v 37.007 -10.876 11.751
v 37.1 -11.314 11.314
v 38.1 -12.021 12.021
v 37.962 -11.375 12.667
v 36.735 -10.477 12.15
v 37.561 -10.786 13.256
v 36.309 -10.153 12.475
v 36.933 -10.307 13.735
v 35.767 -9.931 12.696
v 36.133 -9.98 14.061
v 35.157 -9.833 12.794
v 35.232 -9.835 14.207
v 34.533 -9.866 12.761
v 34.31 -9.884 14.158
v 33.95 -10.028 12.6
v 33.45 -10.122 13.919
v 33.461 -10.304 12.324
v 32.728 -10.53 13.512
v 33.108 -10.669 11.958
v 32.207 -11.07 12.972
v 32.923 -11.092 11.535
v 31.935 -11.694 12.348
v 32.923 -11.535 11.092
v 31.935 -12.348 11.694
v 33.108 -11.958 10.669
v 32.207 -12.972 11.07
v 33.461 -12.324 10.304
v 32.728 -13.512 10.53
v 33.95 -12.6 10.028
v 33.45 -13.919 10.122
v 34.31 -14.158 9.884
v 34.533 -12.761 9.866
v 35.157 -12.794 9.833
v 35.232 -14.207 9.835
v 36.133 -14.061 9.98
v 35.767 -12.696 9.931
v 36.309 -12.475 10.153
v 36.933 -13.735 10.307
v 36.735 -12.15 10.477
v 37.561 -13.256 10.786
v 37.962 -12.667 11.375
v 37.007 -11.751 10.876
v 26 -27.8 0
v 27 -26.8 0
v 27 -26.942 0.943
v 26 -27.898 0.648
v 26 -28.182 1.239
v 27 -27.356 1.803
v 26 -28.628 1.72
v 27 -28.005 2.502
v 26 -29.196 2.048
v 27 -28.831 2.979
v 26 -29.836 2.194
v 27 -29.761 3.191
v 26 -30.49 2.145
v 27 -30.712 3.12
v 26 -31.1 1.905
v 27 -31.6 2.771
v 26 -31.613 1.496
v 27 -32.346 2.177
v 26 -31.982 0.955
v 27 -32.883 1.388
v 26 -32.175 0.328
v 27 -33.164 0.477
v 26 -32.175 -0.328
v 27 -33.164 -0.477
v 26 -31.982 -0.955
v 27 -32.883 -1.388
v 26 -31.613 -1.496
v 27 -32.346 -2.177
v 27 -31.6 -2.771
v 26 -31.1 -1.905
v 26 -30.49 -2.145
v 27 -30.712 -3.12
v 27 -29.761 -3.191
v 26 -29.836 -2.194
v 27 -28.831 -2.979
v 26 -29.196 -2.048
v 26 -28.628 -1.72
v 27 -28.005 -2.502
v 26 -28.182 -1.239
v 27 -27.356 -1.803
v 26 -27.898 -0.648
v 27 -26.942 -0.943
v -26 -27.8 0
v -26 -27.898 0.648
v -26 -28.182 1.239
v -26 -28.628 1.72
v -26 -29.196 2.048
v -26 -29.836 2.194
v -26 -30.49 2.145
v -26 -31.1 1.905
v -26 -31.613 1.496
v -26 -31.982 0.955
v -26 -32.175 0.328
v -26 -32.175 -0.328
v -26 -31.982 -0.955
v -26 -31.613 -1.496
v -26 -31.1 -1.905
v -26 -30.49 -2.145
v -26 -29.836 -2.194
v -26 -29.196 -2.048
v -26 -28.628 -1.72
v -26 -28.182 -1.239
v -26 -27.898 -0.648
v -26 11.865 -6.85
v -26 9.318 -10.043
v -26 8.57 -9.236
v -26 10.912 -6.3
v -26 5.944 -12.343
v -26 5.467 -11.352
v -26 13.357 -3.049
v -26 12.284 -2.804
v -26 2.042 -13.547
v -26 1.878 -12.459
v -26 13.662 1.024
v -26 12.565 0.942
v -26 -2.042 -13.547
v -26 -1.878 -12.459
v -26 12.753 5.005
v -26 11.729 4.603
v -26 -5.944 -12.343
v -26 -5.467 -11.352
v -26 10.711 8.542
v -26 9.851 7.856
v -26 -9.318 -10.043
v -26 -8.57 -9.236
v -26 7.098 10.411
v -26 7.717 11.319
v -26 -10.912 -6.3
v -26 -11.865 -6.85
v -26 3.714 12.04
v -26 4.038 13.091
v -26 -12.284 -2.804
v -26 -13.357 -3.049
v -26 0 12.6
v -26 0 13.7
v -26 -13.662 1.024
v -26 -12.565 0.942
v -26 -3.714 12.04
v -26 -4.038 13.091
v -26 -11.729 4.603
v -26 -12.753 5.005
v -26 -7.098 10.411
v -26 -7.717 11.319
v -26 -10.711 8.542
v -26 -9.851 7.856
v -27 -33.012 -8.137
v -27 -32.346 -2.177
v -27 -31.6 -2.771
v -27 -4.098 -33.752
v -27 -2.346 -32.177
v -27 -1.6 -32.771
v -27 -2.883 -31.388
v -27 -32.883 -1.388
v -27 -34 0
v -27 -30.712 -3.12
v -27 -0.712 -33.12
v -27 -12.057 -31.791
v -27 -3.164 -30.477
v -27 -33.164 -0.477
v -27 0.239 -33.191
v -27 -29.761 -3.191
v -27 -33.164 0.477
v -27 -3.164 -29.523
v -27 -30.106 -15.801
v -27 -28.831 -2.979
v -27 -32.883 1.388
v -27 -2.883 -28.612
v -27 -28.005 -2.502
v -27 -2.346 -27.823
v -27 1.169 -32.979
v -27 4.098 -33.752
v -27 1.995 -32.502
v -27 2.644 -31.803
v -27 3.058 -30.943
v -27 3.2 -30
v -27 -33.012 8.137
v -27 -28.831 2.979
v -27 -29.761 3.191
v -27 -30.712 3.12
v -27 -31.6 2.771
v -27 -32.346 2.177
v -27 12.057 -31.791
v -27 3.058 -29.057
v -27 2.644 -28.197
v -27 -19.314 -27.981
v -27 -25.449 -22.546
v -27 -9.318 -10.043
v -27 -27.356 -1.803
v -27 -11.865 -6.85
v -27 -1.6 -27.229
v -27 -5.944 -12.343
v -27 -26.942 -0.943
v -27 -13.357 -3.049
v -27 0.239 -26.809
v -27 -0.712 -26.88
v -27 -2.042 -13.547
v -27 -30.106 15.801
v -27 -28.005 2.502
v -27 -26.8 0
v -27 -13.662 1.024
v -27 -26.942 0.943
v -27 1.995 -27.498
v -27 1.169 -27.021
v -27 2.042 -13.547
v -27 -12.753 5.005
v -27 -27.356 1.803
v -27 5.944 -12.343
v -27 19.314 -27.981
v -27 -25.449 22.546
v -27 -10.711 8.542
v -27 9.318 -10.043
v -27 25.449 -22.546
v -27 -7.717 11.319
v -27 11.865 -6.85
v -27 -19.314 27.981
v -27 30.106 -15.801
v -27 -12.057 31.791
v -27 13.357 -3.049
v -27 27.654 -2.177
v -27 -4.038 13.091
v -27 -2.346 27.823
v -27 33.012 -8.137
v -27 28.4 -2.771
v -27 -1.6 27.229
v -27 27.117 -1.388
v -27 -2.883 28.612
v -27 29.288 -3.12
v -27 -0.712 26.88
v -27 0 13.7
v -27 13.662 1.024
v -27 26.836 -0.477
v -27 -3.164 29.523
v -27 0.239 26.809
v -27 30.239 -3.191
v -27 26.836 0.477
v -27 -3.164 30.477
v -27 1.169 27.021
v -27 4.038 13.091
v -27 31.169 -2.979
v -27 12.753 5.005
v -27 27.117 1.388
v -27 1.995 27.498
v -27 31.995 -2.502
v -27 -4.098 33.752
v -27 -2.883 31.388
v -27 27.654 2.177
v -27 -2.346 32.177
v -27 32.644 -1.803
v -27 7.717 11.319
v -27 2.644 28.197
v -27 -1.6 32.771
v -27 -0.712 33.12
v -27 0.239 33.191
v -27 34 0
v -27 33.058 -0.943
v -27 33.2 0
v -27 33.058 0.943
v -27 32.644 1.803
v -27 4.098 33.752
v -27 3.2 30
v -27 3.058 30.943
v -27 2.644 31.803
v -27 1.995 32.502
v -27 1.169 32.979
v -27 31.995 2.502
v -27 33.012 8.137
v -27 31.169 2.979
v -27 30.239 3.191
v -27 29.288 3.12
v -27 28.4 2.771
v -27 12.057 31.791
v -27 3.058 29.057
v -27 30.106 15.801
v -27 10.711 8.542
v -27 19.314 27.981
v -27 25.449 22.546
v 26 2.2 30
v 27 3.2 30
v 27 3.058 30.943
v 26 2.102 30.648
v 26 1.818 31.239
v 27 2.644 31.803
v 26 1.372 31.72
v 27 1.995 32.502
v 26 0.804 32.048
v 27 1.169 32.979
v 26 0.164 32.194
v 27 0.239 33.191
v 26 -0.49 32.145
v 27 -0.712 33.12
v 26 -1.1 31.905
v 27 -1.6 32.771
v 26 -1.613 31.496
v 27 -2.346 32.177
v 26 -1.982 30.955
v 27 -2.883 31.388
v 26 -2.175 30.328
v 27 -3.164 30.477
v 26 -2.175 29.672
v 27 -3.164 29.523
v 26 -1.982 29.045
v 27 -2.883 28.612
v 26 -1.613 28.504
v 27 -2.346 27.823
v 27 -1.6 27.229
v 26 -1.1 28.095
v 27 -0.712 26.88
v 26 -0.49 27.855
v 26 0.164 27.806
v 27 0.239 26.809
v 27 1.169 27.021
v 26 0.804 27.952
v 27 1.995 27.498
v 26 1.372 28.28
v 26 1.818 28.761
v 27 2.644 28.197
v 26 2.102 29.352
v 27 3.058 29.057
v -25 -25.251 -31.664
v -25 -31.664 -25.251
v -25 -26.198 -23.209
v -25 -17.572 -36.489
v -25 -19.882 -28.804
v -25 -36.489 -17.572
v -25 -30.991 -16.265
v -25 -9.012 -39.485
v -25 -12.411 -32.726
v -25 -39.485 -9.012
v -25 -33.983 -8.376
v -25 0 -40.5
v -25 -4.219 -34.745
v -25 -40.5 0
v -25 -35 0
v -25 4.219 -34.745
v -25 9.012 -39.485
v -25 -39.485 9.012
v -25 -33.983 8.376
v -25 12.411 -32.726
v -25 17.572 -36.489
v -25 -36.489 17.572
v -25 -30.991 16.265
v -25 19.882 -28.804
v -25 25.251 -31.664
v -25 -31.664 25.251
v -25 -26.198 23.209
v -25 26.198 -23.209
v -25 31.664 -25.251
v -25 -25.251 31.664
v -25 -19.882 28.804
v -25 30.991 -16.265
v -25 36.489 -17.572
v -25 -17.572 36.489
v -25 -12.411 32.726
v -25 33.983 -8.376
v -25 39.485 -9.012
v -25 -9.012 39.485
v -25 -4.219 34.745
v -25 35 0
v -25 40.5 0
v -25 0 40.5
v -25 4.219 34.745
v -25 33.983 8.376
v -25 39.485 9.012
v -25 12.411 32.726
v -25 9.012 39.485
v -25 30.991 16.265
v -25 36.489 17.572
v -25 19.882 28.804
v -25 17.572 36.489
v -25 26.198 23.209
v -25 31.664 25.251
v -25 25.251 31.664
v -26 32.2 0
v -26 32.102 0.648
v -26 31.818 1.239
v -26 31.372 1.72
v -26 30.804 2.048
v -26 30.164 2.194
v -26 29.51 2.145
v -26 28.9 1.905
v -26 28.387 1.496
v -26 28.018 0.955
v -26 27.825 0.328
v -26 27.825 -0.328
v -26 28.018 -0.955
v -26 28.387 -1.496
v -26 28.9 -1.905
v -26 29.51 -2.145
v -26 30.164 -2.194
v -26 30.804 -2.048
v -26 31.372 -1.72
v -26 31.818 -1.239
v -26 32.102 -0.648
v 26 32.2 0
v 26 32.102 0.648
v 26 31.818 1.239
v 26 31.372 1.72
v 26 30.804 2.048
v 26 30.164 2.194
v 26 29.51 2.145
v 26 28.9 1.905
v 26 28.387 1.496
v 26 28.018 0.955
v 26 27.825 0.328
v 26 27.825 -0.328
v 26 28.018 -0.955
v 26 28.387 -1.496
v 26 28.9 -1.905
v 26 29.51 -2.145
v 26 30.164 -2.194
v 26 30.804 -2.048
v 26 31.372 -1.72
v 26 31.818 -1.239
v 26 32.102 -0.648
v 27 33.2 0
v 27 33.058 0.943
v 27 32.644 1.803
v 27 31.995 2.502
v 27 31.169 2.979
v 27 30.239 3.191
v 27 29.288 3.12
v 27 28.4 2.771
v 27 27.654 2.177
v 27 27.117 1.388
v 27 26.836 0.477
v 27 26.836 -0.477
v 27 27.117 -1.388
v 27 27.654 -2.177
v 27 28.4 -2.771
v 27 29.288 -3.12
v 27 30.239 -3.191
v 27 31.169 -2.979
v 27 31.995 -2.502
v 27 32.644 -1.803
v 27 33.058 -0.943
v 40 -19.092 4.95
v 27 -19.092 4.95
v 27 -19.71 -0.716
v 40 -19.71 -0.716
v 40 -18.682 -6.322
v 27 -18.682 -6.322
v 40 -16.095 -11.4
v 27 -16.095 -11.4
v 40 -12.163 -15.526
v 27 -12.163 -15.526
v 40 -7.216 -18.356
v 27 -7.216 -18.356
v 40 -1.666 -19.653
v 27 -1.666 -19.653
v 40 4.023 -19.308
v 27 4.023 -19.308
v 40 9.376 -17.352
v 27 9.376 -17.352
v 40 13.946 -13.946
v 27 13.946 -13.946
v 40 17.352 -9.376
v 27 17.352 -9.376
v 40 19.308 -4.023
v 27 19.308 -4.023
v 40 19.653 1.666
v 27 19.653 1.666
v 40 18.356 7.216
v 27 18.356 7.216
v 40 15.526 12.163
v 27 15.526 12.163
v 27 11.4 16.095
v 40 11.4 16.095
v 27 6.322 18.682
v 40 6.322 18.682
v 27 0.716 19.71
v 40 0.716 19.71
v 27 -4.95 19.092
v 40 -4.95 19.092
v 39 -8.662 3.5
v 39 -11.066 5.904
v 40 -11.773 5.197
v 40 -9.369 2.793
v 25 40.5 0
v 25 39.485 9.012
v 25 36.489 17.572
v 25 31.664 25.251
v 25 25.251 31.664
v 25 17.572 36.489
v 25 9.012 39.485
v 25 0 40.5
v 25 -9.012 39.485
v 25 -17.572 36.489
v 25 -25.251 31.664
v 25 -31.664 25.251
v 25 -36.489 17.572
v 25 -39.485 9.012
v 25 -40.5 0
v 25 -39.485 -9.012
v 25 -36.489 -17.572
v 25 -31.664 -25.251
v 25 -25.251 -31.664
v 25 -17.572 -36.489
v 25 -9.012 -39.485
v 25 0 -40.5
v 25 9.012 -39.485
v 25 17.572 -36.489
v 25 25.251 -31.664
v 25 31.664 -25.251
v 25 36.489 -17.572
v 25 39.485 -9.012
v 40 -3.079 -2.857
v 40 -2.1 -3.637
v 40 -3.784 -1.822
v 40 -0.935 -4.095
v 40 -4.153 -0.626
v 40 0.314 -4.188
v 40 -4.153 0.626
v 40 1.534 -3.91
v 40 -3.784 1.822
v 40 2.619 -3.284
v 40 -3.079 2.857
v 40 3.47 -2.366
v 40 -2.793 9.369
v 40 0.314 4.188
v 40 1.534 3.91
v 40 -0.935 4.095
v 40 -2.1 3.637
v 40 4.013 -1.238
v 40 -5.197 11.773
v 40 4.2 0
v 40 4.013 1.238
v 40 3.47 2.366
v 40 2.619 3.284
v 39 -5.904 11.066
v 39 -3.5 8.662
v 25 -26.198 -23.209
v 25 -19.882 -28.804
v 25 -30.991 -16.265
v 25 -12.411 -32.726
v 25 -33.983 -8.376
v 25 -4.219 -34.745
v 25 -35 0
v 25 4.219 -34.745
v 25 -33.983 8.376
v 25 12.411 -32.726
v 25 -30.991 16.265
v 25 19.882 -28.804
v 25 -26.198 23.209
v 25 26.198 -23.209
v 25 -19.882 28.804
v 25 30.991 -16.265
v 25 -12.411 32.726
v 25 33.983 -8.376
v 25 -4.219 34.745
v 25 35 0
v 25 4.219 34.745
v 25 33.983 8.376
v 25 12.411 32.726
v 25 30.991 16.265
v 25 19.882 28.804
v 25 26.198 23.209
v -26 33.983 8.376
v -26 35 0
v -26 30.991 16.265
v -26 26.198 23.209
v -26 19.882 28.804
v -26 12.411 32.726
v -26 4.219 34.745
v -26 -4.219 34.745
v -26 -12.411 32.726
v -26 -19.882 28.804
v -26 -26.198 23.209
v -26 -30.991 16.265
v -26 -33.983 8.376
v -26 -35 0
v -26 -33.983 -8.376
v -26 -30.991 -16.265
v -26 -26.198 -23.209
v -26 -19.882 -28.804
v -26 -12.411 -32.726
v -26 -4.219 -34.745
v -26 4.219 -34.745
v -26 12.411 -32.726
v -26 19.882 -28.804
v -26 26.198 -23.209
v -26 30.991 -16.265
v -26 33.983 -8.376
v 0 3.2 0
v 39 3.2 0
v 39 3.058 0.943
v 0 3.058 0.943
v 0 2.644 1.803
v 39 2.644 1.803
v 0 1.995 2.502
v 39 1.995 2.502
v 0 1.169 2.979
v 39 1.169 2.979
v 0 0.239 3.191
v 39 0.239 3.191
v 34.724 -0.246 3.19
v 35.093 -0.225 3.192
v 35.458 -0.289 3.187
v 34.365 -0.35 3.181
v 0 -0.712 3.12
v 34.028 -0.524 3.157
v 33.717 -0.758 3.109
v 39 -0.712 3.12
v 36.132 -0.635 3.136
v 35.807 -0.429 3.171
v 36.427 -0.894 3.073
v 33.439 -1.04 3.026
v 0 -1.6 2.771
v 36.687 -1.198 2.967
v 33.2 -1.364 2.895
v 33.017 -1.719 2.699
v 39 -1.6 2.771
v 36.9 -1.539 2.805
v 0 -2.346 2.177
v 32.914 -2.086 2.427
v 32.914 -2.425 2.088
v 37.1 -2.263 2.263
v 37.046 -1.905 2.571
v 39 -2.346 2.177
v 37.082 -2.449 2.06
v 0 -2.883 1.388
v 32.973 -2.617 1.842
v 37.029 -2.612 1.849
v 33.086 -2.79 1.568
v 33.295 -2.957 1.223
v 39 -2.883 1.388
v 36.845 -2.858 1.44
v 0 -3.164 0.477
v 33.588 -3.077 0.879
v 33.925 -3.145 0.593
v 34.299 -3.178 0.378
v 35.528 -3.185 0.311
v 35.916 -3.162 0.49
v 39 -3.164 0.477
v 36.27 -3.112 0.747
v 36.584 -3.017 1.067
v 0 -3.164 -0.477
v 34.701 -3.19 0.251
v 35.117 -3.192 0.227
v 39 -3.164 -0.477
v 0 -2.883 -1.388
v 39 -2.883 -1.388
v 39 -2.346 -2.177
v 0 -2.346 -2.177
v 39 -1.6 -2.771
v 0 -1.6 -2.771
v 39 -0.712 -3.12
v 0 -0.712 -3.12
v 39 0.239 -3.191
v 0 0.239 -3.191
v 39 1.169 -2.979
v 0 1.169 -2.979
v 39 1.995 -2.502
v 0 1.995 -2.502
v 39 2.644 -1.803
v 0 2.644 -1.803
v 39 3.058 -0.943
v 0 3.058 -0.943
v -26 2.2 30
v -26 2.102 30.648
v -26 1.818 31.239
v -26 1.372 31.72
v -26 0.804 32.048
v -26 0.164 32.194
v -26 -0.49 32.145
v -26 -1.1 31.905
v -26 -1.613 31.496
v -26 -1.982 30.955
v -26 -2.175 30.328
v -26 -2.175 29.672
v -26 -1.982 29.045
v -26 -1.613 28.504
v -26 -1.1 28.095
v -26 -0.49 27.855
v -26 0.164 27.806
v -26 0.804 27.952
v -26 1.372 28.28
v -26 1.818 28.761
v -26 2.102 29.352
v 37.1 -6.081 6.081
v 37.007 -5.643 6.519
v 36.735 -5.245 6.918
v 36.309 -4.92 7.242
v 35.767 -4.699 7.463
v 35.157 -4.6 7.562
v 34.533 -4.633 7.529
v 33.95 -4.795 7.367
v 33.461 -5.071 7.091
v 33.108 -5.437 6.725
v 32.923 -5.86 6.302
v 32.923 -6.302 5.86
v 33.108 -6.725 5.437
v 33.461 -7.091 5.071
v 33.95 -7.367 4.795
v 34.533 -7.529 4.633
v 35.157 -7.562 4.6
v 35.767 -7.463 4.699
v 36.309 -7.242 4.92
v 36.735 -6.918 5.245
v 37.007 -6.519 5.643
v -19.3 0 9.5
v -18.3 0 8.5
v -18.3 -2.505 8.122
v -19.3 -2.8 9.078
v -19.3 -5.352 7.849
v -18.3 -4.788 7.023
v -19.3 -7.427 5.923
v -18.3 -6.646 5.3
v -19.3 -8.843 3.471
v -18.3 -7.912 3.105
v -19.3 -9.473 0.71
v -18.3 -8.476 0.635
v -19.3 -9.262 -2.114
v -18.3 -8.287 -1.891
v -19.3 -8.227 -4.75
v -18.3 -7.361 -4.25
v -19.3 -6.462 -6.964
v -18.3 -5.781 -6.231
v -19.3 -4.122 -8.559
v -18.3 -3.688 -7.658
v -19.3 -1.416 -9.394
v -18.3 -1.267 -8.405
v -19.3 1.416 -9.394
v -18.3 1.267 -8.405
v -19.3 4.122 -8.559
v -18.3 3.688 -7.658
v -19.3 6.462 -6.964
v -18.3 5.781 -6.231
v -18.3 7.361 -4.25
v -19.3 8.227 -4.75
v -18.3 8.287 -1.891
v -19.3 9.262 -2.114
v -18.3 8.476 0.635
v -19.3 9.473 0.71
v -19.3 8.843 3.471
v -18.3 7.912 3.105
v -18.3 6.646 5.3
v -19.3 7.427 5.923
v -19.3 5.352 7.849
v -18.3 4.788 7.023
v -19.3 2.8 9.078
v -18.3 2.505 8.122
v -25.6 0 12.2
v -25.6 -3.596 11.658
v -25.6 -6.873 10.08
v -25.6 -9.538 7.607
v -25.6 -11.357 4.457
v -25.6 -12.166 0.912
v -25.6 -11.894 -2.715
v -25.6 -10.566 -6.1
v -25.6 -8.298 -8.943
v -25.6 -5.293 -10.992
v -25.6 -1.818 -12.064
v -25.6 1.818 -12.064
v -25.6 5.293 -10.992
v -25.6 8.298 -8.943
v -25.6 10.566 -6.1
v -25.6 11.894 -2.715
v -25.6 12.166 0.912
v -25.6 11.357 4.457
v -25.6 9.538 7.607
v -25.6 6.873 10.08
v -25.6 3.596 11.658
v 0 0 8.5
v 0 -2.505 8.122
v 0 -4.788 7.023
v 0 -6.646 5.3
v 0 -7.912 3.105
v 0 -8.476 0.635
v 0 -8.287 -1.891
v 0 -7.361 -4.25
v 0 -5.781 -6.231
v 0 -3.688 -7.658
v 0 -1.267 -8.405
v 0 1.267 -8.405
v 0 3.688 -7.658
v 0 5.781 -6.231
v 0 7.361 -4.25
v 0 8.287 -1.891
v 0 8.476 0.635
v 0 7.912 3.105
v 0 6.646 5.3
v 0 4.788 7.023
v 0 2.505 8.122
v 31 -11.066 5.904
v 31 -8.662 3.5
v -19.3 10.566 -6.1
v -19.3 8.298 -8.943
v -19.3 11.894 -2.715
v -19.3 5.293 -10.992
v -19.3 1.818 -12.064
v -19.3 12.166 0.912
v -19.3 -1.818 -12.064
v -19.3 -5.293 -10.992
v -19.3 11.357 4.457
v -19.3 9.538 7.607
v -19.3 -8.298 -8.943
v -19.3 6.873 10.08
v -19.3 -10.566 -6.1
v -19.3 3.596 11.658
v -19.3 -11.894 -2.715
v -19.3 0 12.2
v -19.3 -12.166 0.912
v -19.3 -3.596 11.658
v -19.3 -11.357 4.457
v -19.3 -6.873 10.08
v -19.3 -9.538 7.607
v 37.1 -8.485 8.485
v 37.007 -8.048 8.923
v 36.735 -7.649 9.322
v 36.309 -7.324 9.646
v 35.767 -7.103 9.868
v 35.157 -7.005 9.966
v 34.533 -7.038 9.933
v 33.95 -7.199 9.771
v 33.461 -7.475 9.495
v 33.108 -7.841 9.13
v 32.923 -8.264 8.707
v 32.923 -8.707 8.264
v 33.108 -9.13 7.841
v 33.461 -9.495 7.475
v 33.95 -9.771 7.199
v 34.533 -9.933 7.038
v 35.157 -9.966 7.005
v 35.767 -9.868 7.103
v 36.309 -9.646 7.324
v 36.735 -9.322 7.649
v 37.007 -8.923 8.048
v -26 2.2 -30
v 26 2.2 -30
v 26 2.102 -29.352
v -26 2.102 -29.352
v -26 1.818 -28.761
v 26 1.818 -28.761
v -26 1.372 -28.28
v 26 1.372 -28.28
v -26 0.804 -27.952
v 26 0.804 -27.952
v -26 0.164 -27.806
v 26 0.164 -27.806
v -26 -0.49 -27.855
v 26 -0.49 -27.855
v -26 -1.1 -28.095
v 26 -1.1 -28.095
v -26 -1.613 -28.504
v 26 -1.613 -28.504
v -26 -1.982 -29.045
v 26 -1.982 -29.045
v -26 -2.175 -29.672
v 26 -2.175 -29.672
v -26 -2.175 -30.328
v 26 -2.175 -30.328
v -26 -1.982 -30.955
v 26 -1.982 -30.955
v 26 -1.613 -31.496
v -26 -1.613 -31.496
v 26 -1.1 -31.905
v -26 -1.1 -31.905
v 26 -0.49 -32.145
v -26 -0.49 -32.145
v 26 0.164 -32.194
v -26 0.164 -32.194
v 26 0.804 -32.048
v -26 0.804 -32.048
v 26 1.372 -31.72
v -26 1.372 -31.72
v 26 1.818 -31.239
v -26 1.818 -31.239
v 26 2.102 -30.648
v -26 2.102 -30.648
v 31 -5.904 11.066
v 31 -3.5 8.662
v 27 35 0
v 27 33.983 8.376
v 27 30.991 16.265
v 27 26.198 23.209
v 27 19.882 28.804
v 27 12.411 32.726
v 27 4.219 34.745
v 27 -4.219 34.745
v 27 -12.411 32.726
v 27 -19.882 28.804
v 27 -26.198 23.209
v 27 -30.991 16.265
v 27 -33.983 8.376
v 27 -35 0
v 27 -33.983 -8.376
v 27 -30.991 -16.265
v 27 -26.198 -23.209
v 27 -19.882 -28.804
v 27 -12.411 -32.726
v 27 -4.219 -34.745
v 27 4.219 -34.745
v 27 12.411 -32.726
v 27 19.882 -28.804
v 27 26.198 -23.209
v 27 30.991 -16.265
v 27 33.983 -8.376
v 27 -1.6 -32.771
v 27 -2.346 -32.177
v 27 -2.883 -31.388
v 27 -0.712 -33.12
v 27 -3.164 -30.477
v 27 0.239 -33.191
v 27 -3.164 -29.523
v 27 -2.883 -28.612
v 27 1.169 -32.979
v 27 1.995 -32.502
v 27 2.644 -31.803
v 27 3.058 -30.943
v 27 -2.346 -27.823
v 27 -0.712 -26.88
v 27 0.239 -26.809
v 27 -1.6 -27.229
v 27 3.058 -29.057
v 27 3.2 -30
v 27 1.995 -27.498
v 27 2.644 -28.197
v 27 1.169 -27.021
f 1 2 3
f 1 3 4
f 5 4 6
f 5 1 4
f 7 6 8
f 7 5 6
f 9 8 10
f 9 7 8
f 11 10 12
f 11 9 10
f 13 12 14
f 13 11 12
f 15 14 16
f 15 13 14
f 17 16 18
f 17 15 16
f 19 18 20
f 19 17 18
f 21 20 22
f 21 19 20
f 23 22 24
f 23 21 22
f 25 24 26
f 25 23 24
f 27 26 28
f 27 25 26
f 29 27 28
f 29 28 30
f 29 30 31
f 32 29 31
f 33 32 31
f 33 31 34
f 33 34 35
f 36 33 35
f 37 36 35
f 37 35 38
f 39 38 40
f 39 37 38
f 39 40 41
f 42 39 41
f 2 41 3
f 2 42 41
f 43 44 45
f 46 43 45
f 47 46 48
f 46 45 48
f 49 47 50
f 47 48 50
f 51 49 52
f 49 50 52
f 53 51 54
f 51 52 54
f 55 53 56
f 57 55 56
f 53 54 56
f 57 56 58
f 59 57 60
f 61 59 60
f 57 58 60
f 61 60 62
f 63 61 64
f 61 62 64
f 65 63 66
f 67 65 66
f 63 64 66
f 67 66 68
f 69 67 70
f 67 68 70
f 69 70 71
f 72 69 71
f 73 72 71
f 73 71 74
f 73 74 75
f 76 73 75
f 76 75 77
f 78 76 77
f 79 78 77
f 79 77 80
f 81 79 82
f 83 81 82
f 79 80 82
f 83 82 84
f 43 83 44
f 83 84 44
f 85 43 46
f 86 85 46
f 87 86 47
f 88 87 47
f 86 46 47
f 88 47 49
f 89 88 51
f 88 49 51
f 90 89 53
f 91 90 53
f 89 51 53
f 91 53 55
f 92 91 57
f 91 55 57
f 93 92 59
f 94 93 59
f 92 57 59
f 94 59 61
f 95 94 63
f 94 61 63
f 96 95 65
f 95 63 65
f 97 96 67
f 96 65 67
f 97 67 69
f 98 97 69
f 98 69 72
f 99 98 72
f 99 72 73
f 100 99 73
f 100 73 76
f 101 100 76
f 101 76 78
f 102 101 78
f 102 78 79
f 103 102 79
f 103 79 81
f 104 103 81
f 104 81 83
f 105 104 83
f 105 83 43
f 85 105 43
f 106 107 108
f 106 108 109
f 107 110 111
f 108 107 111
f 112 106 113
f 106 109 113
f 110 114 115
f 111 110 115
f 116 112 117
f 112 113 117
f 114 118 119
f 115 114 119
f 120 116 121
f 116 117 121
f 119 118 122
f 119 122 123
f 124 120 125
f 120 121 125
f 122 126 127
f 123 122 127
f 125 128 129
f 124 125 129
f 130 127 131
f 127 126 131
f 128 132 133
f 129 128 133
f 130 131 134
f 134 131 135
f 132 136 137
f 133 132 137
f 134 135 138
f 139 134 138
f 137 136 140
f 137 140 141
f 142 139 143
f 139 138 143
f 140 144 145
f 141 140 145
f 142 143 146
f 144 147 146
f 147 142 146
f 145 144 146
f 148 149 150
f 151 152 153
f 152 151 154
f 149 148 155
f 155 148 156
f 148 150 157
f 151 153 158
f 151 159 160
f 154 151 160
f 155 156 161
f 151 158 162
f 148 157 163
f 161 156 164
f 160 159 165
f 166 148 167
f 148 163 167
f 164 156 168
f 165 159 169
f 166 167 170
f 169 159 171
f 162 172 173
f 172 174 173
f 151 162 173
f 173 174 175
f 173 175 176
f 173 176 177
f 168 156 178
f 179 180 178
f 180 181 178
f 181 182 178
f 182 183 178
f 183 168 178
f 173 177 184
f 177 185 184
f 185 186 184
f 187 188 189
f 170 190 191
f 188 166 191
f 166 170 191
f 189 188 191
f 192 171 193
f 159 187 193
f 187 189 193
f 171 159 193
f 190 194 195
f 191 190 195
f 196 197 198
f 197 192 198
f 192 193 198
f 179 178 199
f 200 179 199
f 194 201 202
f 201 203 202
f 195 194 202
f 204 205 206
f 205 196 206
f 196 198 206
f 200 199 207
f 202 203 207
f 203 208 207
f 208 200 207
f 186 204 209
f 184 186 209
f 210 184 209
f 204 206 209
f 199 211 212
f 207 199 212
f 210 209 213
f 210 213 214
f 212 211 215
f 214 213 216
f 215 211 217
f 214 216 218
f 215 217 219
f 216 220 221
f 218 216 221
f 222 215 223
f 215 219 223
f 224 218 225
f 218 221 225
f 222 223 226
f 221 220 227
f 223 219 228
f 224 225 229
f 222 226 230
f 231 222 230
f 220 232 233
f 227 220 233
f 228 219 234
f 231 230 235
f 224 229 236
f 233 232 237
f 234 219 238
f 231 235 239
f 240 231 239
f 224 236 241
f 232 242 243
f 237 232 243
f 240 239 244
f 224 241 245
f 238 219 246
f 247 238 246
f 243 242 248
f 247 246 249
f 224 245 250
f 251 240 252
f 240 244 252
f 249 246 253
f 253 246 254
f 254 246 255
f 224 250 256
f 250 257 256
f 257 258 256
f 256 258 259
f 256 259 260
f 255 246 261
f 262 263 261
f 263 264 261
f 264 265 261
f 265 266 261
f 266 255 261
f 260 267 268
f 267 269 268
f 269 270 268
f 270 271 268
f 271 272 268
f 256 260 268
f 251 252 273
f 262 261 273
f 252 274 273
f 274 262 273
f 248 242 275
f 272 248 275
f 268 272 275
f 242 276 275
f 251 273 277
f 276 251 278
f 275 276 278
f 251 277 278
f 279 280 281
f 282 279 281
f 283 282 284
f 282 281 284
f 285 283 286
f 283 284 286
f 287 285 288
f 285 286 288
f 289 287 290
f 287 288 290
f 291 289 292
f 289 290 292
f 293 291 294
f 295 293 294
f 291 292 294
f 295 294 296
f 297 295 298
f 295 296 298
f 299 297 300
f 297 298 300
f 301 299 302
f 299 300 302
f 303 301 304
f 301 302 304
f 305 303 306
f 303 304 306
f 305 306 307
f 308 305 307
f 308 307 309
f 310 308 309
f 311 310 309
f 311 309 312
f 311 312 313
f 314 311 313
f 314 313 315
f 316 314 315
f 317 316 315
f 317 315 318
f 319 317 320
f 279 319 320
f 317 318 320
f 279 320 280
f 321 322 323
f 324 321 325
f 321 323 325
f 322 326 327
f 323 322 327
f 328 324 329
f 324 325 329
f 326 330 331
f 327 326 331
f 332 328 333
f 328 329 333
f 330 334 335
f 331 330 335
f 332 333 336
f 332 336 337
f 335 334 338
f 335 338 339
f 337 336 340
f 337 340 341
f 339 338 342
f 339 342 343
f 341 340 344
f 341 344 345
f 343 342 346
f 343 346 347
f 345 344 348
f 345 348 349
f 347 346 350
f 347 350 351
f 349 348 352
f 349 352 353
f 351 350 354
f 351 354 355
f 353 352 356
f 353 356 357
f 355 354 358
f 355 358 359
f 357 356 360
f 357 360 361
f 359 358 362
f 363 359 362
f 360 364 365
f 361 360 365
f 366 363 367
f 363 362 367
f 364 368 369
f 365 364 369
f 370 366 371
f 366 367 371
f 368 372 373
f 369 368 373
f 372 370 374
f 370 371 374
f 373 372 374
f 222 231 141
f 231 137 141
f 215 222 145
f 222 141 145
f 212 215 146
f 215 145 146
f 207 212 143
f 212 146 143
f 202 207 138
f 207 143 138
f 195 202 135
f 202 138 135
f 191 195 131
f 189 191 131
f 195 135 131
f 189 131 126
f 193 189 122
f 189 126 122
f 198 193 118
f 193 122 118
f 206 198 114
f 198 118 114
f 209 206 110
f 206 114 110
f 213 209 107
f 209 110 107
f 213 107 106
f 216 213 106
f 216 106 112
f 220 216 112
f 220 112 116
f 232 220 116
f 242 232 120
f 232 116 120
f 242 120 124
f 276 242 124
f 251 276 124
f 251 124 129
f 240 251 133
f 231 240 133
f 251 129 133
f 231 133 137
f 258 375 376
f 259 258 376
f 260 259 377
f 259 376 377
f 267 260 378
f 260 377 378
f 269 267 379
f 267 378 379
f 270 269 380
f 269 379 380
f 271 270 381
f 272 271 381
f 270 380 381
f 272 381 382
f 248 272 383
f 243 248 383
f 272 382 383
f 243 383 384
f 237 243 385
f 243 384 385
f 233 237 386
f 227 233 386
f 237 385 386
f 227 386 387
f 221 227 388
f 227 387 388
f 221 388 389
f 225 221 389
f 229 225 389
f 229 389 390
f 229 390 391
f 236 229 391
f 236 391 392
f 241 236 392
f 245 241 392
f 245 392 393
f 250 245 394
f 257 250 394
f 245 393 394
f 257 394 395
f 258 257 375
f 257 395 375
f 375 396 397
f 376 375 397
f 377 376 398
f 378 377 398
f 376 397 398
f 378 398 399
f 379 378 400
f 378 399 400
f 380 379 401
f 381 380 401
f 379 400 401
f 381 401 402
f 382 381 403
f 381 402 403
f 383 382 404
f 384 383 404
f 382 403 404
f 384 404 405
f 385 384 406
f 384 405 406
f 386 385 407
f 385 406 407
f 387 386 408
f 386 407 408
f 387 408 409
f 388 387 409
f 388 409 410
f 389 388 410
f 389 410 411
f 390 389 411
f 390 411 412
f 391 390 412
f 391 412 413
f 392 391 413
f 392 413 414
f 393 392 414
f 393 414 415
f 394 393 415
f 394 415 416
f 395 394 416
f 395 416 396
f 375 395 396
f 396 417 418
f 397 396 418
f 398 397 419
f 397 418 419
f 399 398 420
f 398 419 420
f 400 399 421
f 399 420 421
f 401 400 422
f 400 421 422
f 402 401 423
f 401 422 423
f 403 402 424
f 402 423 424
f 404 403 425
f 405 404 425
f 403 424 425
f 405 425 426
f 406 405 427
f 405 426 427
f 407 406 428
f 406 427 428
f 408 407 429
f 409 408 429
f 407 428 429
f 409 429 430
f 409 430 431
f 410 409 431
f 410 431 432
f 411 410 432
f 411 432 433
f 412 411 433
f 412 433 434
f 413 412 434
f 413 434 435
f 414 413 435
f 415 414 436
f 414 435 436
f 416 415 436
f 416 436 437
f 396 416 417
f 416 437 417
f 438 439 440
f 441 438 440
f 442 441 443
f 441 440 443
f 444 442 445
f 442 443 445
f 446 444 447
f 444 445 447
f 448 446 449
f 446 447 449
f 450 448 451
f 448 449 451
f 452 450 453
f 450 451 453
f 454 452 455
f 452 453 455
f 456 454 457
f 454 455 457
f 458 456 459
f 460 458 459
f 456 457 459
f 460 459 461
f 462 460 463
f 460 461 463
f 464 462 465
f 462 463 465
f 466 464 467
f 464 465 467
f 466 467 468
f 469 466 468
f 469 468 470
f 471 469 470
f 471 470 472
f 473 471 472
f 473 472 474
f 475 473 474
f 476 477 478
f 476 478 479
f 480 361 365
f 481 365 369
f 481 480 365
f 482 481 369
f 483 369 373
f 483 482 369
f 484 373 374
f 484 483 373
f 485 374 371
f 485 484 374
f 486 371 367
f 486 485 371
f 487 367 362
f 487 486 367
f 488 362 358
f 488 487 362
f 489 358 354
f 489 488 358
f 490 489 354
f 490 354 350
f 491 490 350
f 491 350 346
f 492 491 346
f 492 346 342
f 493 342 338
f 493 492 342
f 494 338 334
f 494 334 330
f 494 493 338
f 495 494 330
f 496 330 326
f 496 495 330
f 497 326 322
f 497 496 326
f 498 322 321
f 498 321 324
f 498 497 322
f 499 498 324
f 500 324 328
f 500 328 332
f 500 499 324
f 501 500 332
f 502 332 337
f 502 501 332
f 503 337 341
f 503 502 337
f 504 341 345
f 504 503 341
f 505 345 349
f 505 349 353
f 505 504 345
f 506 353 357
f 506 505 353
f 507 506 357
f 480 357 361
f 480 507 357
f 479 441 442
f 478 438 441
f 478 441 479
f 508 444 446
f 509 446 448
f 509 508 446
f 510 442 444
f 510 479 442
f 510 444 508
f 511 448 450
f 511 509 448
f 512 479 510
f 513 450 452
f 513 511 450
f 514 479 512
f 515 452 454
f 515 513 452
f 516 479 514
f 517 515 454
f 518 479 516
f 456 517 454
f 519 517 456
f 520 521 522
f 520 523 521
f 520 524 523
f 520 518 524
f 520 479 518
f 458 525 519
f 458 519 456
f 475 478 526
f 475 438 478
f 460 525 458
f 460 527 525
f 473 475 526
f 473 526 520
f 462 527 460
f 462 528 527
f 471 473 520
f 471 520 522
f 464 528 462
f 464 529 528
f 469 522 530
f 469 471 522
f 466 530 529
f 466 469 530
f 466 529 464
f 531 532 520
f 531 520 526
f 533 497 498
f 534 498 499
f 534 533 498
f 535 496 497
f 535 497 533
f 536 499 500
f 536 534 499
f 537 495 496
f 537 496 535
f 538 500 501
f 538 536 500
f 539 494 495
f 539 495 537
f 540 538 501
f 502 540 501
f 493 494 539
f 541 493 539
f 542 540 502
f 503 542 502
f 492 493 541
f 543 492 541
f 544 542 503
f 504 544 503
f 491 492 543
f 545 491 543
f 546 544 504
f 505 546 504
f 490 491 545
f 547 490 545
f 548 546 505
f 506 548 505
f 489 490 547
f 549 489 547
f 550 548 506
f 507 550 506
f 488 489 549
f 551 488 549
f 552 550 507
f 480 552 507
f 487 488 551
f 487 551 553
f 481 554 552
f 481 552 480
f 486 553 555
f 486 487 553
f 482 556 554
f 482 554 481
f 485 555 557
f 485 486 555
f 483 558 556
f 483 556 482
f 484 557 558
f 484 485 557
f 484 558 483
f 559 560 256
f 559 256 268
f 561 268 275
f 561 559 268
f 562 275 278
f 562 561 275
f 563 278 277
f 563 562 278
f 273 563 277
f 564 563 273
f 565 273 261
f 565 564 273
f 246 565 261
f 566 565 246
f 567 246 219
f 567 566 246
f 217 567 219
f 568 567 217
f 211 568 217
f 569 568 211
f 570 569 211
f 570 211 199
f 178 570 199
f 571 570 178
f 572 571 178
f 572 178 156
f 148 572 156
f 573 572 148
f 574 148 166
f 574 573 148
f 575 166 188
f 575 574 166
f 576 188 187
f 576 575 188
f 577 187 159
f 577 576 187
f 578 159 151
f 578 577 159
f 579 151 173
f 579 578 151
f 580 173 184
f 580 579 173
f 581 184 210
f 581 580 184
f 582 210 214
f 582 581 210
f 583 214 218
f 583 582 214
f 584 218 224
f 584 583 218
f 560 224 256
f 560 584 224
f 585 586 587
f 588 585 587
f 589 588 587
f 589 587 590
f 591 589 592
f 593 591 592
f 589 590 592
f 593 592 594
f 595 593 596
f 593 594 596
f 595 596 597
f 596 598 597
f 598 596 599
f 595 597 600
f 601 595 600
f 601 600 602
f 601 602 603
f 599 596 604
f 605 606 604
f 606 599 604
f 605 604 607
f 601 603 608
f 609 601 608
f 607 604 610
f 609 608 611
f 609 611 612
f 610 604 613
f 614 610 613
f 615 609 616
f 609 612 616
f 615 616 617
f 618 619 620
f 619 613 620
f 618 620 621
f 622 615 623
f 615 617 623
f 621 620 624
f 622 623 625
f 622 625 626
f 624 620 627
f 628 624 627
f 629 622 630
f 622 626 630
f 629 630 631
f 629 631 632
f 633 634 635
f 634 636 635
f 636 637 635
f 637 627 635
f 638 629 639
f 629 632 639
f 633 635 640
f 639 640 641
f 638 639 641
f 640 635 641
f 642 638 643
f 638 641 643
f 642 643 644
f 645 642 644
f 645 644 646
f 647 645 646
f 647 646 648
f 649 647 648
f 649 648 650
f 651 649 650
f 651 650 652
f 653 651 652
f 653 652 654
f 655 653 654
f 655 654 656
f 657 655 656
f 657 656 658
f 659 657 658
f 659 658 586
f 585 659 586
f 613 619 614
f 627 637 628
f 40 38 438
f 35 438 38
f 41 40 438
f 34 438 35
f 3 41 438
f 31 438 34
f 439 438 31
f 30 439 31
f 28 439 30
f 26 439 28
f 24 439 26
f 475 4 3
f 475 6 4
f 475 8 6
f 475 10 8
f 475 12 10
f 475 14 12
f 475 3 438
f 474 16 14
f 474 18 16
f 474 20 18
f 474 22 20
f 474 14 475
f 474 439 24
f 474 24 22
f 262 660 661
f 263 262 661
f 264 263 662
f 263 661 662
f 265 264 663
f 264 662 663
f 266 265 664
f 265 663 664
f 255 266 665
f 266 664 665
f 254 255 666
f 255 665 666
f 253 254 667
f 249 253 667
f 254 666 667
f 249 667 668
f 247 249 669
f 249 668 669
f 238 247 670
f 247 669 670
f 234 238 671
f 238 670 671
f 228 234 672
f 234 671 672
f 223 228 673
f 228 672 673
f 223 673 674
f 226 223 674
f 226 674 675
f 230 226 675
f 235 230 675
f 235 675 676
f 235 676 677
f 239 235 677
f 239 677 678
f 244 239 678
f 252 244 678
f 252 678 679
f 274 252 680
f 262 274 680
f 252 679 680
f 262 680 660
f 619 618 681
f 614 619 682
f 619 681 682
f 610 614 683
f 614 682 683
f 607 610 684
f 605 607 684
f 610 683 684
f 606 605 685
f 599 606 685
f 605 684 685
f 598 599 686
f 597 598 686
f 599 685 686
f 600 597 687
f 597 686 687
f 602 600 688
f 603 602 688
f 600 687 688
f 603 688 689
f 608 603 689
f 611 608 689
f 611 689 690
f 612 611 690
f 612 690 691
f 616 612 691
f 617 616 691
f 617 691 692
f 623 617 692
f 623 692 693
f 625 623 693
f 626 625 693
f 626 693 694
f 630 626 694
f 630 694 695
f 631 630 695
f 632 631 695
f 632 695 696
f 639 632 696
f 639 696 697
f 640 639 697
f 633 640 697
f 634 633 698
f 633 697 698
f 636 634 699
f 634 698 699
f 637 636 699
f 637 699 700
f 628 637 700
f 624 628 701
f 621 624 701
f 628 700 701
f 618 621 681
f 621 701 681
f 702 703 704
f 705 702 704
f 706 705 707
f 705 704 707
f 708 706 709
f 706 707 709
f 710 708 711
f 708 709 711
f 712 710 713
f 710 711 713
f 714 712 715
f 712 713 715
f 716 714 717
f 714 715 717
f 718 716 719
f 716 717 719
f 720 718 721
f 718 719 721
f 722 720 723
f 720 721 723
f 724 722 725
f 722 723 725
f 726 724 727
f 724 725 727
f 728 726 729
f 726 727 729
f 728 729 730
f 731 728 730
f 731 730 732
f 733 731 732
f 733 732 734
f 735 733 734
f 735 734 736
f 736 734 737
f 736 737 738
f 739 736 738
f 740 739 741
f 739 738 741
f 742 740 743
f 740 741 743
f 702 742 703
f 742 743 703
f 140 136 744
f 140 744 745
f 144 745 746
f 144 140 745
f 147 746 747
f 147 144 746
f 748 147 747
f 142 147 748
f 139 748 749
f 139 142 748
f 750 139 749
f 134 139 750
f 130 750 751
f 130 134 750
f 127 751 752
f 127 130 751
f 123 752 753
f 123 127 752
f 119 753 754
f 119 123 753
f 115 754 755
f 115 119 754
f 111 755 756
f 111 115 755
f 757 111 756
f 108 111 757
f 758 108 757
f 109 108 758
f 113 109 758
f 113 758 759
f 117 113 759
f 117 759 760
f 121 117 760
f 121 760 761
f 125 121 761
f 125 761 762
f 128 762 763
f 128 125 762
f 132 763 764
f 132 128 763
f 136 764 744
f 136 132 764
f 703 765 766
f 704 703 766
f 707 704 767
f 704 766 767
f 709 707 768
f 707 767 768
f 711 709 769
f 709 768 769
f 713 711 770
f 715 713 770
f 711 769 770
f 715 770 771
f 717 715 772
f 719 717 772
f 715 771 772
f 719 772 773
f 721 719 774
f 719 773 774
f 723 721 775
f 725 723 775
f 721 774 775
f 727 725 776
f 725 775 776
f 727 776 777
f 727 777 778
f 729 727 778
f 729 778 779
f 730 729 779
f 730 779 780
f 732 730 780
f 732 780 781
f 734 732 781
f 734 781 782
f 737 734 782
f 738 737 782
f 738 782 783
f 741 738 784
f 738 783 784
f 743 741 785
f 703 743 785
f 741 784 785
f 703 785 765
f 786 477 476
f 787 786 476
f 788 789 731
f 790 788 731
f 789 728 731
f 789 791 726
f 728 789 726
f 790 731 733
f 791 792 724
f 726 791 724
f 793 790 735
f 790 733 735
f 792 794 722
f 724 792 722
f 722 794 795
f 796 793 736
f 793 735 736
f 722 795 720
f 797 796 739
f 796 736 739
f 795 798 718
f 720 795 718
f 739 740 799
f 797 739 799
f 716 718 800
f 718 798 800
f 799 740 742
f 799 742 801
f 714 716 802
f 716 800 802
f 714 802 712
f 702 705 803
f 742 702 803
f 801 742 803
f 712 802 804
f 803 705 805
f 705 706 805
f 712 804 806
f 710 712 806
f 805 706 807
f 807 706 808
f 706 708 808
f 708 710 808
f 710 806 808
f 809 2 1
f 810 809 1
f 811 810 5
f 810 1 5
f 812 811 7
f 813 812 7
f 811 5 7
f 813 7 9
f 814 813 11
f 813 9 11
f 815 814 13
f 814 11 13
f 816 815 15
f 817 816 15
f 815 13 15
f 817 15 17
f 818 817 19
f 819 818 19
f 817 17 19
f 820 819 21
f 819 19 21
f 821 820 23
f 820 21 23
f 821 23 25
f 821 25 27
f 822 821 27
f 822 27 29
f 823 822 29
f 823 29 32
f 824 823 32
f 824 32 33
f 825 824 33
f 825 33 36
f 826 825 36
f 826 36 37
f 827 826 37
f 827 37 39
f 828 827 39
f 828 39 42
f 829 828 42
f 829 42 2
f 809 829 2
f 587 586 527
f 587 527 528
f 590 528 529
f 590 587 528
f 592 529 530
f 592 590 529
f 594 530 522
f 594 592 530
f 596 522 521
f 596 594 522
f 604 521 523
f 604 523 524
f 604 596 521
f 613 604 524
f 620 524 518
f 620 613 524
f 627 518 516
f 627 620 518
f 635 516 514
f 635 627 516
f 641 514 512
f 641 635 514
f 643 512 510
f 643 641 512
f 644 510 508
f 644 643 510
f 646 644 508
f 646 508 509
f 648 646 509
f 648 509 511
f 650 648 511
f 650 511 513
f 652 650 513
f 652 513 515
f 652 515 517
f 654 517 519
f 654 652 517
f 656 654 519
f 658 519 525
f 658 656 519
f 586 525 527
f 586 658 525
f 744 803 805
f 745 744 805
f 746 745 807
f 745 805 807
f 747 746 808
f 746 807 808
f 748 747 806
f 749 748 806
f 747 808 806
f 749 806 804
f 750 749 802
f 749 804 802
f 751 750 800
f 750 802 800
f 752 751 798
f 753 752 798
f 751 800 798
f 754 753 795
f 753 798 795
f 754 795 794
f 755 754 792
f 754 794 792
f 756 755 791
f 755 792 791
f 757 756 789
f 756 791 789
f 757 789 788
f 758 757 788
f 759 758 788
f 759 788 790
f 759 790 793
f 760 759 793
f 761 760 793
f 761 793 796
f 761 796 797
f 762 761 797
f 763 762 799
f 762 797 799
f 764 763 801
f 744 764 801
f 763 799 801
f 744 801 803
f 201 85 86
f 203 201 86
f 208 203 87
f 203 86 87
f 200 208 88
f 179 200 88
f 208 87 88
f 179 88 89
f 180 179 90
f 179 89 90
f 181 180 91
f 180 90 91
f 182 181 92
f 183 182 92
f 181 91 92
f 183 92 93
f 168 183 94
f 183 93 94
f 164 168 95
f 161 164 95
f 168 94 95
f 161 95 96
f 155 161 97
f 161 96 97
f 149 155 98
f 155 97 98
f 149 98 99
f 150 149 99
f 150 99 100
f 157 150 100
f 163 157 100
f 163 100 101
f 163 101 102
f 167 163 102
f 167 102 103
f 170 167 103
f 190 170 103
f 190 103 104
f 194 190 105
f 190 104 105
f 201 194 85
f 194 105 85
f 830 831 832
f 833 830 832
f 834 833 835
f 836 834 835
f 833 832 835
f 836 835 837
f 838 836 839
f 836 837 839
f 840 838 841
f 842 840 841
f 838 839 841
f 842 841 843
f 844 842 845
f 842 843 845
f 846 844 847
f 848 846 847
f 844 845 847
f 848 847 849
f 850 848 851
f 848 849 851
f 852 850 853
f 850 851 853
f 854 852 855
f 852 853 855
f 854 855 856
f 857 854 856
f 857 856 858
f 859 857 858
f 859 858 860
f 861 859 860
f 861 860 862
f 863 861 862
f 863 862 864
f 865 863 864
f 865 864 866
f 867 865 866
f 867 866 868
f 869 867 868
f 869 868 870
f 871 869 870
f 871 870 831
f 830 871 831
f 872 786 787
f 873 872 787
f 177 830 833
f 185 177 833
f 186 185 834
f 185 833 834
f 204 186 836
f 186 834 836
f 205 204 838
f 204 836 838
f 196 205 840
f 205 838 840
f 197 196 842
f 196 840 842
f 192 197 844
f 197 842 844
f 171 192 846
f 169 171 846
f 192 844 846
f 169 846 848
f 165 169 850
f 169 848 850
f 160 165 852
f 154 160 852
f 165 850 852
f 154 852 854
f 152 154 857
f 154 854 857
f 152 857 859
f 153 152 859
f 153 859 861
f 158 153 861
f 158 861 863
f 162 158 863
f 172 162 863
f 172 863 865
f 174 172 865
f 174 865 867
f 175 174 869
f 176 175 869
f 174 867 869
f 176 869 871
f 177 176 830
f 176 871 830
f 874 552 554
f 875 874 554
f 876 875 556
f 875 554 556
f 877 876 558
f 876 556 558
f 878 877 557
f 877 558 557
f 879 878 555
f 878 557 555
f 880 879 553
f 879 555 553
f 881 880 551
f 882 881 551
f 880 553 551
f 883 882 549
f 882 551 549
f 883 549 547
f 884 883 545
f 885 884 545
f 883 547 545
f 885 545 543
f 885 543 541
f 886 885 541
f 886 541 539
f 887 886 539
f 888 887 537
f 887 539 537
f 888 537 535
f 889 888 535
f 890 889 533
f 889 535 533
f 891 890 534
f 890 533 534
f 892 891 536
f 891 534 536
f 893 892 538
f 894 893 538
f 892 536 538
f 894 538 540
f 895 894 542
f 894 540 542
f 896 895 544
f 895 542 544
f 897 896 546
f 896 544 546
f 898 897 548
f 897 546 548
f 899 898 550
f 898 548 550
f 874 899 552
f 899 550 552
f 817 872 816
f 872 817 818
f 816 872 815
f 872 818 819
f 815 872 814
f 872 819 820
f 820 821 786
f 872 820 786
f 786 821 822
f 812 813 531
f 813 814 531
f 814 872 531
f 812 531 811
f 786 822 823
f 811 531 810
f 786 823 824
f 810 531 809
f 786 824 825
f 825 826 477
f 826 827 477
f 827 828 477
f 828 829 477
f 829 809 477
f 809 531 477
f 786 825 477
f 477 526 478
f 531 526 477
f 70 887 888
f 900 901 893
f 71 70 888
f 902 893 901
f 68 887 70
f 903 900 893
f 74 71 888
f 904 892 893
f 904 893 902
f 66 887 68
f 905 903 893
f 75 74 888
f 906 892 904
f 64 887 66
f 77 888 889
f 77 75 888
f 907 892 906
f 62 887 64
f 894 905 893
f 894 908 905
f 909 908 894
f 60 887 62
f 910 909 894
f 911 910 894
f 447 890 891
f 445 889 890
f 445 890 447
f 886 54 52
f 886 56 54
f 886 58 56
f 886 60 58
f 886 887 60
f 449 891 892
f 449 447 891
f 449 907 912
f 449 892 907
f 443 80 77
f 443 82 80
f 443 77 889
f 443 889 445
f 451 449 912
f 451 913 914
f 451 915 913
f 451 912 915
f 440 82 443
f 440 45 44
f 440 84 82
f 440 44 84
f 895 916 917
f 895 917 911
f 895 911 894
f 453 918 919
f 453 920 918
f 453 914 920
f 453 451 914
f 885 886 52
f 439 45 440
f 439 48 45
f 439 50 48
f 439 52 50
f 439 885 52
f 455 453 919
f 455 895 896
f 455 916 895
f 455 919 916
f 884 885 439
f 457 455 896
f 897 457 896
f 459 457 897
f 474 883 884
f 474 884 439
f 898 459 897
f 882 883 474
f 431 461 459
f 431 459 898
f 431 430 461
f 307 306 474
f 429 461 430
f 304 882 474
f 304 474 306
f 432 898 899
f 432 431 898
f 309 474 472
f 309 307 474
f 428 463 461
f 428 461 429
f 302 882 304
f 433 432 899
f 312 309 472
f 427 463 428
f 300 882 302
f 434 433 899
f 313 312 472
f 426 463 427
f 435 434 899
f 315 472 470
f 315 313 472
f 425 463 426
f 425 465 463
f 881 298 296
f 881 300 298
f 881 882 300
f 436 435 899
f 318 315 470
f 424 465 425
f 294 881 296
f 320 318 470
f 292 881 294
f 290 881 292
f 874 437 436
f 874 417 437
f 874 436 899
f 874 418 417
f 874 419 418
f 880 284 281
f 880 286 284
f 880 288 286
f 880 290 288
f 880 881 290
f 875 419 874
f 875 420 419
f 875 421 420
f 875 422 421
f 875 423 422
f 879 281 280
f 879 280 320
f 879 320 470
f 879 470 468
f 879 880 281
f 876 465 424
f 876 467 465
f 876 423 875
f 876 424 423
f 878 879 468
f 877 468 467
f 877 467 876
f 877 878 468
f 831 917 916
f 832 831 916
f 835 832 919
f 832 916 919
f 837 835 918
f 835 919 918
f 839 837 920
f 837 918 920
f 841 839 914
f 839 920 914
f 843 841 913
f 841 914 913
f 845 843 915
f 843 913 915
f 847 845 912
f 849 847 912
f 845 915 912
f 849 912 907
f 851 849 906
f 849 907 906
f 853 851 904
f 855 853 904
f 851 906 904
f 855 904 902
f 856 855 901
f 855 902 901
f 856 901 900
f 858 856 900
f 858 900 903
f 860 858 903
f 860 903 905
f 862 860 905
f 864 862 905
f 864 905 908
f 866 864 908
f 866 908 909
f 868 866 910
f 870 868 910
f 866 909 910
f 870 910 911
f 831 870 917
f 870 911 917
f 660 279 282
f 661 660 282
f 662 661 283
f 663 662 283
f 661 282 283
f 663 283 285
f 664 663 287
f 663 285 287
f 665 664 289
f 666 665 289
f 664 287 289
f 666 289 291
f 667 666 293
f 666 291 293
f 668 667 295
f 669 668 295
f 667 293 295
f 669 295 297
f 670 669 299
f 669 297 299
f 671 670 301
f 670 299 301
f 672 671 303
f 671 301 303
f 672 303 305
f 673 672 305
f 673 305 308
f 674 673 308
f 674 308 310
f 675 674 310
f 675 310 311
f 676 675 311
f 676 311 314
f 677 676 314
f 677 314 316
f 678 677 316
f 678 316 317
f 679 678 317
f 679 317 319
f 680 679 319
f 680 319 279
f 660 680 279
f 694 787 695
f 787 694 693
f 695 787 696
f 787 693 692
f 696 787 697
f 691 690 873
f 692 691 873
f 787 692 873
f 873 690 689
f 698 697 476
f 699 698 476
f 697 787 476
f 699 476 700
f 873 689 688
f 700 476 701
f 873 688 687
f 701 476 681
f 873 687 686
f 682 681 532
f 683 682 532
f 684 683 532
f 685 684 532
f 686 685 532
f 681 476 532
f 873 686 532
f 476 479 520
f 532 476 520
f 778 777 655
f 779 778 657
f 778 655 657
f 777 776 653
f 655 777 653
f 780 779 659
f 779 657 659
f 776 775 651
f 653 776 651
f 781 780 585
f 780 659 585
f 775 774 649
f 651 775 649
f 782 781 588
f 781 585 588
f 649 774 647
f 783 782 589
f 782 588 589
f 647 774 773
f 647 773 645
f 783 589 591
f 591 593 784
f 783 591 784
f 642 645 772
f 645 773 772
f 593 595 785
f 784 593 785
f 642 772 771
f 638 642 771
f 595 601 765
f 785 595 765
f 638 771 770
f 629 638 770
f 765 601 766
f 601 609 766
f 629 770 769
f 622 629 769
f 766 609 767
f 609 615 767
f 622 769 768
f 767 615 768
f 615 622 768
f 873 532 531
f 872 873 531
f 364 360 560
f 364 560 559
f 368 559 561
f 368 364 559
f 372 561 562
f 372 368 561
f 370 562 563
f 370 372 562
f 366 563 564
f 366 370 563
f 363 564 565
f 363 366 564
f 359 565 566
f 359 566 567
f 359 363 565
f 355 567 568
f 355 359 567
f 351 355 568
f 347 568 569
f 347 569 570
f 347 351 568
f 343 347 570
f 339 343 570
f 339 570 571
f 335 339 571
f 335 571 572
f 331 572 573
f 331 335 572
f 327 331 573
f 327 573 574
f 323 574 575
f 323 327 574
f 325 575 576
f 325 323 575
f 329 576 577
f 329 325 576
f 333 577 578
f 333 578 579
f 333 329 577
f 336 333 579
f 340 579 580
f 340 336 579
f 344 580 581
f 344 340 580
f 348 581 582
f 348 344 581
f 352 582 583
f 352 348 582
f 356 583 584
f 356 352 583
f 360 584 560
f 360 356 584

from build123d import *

# Parameters (mm, degrees)
SKETCH012_R     = 40.5
PAD008_DEPTH    = 25
SKETCH015_R     = 35
PAD011_DEPTH    = 2
SKETCH016_R     = 2.2
POCKET003_DEPTH = 54.001
PAD013_DEPTH    = 13
SKETCH020_R     = 3.2
POCKET004_DEPTH = 67.001
SKETCH019_R     = 2.1
POCKET005_DEPTH = 17
POCKET006_DEPTH = 9
CHAMFER025_SIZE = 1
CHAMFER026_SIZE = 0.4
CHAMFER034_SIZE = 1
CHAMFER035_SIZE = 1


with BuildPart() as part:
    # Sketch012 → Pad008 (new body, symmetric)
    with BuildSketch(Plane.YZ):
        Circle(SKETCH012_R)
    extrude(amount=PAD008_DEPTH, both=True)

    # Sketch015 (on Face3 of Pad008) → Pad011 (join)
    with BuildSketch(Plane.YZ.offset(25)):
        Circle(SKETCH015_R)
    pad011 = extrude(amount=PAD011_DEPTH)

    # Mirrored001: Pad011 across YZ
    add(pad011.mirror(Plane.YZ))

    # Sketch016 (on Face7 of Mirrored001) → Pocket003 (cut, through all)
    with BuildSketch(Plane.YZ.offset(27)):
        with Locations((0, 30)):
            Circle(SKETCH016_R)
        with Locations((-30, 0)):
            Circle(SKETCH016_R)
        with Locations((0, -30)):
            Circle(SKETCH016_R)
        with Locations((30, 0)):
            Circle(SKETCH016_R)
    extrude(amount=-POCKET003_DEPTH, mode=Mode.SUBTRACT)

    # Sketch018 (on Face7 of Pocket003) → Pad013 (join)
    with BuildSketch(Plane.YZ.offset(27)):
        with BuildLine():
            ThreePointArc((-19.091883, 4.949747), (13.946326, -13.946326), (-4.949747, 19.091883))
            Line((-19.091883, 4.949747), (-4.949747, 19.091883))
        make_face()
    extrude(amount=PAD013_DEPTH)

    # Sketch020 (on Face14 of Pad013) → Pocket004 (cut, through all)
    with BuildSketch(Plane.YZ.offset(40)):
        Circle(SKETCH020_R)
    extrude(amount=-POCKET004_DEPTH, mode=Mode.SUBTRACT)

    # Sketch019 (on Face13 of Pad013) → Pocket005 (cut)
    with BuildSketch(Plane(origin=(0, -12.020815, 12.020815), x_dir=(1, 0, 0), z_dir=(0, -0.707107, 0.707107))):
        with Locations((35, 0)):
            Circle(SKETCH019_R)
    extrude(amount=-POCKET005_DEPTH, mode=Mode.SUBTRACT)

    # Sketch021 (on Face15 of Pocket005) → Pocket006 (cut)
    with BuildSketch(Plane.YZ.offset(40)):
        Polygon((-11.066221, 5.904342), (-8.662058, 3.500179), (-3.500179, 8.662058), (-5.904342, 11.066221), align=None)
    extrude(amount=-POCKET006_DEPTH, mode=Mode.SUBTRACT)

    # Sketch067 → Groove (revolve, cut)
    with BuildSketch(Plane.XZ):
        Polygon((-27.5, 0), (-27.5, 13.7), (-26, 13.7), (-26, 12.2), (-19.3, 12.2), (-19.3, 8.5), (0, 8.5), (0, 0), align=None)
    revolve(axis=Axis((0, 0, 0), (1, 0, 0)), mode=Mode.SUBTRACT)

    # Chamfer025
    chamfer025_edges = [part.edges().sort_by_distance(p)[0] for p in [
        (-19.3, 0, -8.5),
    ]]
    chamfer(chamfer025_edges, length=CHAMFER025_SIZE)

    # Chamfer026
    chamfer026_edges = [part.edges().sort_by_distance(p)[0] for p in [
        (-26, 0, -12.2),
    ]]
    chamfer(chamfer026_edges, length=CHAMFER026_SIZE)

    # Chamfer034
    chamfer034_edges = [part.edges().sort_by_distance(p)[0] for p in [
        (-27, 27.8, 0),
        (-27, -2.2, 30),
        (-27, -32.2, 0),
        (-27, -2.2, -30),
        (27, -32.2, 0),
        (27, -2.2, -30),
        (27, 27.8, 0),
        (27, -2.2, 30),
        (-27, -35, 0),
    ]]
    chamfer(chamfer034_edges, length=CHAMFER034_SIZE)

    # Chamfer035
    chamfer035_edges = [part.edges().sort_by_distance(p)[0] for p in [
        (40, -3.2, 0),
        (32.9, -12.020815, 12.020815),
        (40, -9.86414, 4.70226),
        (40, -4.70226, 9.86414),
    ]]
    chamfer(chamfer035_edges, length=CHAMFER035_SIZE)


solid = part.part
